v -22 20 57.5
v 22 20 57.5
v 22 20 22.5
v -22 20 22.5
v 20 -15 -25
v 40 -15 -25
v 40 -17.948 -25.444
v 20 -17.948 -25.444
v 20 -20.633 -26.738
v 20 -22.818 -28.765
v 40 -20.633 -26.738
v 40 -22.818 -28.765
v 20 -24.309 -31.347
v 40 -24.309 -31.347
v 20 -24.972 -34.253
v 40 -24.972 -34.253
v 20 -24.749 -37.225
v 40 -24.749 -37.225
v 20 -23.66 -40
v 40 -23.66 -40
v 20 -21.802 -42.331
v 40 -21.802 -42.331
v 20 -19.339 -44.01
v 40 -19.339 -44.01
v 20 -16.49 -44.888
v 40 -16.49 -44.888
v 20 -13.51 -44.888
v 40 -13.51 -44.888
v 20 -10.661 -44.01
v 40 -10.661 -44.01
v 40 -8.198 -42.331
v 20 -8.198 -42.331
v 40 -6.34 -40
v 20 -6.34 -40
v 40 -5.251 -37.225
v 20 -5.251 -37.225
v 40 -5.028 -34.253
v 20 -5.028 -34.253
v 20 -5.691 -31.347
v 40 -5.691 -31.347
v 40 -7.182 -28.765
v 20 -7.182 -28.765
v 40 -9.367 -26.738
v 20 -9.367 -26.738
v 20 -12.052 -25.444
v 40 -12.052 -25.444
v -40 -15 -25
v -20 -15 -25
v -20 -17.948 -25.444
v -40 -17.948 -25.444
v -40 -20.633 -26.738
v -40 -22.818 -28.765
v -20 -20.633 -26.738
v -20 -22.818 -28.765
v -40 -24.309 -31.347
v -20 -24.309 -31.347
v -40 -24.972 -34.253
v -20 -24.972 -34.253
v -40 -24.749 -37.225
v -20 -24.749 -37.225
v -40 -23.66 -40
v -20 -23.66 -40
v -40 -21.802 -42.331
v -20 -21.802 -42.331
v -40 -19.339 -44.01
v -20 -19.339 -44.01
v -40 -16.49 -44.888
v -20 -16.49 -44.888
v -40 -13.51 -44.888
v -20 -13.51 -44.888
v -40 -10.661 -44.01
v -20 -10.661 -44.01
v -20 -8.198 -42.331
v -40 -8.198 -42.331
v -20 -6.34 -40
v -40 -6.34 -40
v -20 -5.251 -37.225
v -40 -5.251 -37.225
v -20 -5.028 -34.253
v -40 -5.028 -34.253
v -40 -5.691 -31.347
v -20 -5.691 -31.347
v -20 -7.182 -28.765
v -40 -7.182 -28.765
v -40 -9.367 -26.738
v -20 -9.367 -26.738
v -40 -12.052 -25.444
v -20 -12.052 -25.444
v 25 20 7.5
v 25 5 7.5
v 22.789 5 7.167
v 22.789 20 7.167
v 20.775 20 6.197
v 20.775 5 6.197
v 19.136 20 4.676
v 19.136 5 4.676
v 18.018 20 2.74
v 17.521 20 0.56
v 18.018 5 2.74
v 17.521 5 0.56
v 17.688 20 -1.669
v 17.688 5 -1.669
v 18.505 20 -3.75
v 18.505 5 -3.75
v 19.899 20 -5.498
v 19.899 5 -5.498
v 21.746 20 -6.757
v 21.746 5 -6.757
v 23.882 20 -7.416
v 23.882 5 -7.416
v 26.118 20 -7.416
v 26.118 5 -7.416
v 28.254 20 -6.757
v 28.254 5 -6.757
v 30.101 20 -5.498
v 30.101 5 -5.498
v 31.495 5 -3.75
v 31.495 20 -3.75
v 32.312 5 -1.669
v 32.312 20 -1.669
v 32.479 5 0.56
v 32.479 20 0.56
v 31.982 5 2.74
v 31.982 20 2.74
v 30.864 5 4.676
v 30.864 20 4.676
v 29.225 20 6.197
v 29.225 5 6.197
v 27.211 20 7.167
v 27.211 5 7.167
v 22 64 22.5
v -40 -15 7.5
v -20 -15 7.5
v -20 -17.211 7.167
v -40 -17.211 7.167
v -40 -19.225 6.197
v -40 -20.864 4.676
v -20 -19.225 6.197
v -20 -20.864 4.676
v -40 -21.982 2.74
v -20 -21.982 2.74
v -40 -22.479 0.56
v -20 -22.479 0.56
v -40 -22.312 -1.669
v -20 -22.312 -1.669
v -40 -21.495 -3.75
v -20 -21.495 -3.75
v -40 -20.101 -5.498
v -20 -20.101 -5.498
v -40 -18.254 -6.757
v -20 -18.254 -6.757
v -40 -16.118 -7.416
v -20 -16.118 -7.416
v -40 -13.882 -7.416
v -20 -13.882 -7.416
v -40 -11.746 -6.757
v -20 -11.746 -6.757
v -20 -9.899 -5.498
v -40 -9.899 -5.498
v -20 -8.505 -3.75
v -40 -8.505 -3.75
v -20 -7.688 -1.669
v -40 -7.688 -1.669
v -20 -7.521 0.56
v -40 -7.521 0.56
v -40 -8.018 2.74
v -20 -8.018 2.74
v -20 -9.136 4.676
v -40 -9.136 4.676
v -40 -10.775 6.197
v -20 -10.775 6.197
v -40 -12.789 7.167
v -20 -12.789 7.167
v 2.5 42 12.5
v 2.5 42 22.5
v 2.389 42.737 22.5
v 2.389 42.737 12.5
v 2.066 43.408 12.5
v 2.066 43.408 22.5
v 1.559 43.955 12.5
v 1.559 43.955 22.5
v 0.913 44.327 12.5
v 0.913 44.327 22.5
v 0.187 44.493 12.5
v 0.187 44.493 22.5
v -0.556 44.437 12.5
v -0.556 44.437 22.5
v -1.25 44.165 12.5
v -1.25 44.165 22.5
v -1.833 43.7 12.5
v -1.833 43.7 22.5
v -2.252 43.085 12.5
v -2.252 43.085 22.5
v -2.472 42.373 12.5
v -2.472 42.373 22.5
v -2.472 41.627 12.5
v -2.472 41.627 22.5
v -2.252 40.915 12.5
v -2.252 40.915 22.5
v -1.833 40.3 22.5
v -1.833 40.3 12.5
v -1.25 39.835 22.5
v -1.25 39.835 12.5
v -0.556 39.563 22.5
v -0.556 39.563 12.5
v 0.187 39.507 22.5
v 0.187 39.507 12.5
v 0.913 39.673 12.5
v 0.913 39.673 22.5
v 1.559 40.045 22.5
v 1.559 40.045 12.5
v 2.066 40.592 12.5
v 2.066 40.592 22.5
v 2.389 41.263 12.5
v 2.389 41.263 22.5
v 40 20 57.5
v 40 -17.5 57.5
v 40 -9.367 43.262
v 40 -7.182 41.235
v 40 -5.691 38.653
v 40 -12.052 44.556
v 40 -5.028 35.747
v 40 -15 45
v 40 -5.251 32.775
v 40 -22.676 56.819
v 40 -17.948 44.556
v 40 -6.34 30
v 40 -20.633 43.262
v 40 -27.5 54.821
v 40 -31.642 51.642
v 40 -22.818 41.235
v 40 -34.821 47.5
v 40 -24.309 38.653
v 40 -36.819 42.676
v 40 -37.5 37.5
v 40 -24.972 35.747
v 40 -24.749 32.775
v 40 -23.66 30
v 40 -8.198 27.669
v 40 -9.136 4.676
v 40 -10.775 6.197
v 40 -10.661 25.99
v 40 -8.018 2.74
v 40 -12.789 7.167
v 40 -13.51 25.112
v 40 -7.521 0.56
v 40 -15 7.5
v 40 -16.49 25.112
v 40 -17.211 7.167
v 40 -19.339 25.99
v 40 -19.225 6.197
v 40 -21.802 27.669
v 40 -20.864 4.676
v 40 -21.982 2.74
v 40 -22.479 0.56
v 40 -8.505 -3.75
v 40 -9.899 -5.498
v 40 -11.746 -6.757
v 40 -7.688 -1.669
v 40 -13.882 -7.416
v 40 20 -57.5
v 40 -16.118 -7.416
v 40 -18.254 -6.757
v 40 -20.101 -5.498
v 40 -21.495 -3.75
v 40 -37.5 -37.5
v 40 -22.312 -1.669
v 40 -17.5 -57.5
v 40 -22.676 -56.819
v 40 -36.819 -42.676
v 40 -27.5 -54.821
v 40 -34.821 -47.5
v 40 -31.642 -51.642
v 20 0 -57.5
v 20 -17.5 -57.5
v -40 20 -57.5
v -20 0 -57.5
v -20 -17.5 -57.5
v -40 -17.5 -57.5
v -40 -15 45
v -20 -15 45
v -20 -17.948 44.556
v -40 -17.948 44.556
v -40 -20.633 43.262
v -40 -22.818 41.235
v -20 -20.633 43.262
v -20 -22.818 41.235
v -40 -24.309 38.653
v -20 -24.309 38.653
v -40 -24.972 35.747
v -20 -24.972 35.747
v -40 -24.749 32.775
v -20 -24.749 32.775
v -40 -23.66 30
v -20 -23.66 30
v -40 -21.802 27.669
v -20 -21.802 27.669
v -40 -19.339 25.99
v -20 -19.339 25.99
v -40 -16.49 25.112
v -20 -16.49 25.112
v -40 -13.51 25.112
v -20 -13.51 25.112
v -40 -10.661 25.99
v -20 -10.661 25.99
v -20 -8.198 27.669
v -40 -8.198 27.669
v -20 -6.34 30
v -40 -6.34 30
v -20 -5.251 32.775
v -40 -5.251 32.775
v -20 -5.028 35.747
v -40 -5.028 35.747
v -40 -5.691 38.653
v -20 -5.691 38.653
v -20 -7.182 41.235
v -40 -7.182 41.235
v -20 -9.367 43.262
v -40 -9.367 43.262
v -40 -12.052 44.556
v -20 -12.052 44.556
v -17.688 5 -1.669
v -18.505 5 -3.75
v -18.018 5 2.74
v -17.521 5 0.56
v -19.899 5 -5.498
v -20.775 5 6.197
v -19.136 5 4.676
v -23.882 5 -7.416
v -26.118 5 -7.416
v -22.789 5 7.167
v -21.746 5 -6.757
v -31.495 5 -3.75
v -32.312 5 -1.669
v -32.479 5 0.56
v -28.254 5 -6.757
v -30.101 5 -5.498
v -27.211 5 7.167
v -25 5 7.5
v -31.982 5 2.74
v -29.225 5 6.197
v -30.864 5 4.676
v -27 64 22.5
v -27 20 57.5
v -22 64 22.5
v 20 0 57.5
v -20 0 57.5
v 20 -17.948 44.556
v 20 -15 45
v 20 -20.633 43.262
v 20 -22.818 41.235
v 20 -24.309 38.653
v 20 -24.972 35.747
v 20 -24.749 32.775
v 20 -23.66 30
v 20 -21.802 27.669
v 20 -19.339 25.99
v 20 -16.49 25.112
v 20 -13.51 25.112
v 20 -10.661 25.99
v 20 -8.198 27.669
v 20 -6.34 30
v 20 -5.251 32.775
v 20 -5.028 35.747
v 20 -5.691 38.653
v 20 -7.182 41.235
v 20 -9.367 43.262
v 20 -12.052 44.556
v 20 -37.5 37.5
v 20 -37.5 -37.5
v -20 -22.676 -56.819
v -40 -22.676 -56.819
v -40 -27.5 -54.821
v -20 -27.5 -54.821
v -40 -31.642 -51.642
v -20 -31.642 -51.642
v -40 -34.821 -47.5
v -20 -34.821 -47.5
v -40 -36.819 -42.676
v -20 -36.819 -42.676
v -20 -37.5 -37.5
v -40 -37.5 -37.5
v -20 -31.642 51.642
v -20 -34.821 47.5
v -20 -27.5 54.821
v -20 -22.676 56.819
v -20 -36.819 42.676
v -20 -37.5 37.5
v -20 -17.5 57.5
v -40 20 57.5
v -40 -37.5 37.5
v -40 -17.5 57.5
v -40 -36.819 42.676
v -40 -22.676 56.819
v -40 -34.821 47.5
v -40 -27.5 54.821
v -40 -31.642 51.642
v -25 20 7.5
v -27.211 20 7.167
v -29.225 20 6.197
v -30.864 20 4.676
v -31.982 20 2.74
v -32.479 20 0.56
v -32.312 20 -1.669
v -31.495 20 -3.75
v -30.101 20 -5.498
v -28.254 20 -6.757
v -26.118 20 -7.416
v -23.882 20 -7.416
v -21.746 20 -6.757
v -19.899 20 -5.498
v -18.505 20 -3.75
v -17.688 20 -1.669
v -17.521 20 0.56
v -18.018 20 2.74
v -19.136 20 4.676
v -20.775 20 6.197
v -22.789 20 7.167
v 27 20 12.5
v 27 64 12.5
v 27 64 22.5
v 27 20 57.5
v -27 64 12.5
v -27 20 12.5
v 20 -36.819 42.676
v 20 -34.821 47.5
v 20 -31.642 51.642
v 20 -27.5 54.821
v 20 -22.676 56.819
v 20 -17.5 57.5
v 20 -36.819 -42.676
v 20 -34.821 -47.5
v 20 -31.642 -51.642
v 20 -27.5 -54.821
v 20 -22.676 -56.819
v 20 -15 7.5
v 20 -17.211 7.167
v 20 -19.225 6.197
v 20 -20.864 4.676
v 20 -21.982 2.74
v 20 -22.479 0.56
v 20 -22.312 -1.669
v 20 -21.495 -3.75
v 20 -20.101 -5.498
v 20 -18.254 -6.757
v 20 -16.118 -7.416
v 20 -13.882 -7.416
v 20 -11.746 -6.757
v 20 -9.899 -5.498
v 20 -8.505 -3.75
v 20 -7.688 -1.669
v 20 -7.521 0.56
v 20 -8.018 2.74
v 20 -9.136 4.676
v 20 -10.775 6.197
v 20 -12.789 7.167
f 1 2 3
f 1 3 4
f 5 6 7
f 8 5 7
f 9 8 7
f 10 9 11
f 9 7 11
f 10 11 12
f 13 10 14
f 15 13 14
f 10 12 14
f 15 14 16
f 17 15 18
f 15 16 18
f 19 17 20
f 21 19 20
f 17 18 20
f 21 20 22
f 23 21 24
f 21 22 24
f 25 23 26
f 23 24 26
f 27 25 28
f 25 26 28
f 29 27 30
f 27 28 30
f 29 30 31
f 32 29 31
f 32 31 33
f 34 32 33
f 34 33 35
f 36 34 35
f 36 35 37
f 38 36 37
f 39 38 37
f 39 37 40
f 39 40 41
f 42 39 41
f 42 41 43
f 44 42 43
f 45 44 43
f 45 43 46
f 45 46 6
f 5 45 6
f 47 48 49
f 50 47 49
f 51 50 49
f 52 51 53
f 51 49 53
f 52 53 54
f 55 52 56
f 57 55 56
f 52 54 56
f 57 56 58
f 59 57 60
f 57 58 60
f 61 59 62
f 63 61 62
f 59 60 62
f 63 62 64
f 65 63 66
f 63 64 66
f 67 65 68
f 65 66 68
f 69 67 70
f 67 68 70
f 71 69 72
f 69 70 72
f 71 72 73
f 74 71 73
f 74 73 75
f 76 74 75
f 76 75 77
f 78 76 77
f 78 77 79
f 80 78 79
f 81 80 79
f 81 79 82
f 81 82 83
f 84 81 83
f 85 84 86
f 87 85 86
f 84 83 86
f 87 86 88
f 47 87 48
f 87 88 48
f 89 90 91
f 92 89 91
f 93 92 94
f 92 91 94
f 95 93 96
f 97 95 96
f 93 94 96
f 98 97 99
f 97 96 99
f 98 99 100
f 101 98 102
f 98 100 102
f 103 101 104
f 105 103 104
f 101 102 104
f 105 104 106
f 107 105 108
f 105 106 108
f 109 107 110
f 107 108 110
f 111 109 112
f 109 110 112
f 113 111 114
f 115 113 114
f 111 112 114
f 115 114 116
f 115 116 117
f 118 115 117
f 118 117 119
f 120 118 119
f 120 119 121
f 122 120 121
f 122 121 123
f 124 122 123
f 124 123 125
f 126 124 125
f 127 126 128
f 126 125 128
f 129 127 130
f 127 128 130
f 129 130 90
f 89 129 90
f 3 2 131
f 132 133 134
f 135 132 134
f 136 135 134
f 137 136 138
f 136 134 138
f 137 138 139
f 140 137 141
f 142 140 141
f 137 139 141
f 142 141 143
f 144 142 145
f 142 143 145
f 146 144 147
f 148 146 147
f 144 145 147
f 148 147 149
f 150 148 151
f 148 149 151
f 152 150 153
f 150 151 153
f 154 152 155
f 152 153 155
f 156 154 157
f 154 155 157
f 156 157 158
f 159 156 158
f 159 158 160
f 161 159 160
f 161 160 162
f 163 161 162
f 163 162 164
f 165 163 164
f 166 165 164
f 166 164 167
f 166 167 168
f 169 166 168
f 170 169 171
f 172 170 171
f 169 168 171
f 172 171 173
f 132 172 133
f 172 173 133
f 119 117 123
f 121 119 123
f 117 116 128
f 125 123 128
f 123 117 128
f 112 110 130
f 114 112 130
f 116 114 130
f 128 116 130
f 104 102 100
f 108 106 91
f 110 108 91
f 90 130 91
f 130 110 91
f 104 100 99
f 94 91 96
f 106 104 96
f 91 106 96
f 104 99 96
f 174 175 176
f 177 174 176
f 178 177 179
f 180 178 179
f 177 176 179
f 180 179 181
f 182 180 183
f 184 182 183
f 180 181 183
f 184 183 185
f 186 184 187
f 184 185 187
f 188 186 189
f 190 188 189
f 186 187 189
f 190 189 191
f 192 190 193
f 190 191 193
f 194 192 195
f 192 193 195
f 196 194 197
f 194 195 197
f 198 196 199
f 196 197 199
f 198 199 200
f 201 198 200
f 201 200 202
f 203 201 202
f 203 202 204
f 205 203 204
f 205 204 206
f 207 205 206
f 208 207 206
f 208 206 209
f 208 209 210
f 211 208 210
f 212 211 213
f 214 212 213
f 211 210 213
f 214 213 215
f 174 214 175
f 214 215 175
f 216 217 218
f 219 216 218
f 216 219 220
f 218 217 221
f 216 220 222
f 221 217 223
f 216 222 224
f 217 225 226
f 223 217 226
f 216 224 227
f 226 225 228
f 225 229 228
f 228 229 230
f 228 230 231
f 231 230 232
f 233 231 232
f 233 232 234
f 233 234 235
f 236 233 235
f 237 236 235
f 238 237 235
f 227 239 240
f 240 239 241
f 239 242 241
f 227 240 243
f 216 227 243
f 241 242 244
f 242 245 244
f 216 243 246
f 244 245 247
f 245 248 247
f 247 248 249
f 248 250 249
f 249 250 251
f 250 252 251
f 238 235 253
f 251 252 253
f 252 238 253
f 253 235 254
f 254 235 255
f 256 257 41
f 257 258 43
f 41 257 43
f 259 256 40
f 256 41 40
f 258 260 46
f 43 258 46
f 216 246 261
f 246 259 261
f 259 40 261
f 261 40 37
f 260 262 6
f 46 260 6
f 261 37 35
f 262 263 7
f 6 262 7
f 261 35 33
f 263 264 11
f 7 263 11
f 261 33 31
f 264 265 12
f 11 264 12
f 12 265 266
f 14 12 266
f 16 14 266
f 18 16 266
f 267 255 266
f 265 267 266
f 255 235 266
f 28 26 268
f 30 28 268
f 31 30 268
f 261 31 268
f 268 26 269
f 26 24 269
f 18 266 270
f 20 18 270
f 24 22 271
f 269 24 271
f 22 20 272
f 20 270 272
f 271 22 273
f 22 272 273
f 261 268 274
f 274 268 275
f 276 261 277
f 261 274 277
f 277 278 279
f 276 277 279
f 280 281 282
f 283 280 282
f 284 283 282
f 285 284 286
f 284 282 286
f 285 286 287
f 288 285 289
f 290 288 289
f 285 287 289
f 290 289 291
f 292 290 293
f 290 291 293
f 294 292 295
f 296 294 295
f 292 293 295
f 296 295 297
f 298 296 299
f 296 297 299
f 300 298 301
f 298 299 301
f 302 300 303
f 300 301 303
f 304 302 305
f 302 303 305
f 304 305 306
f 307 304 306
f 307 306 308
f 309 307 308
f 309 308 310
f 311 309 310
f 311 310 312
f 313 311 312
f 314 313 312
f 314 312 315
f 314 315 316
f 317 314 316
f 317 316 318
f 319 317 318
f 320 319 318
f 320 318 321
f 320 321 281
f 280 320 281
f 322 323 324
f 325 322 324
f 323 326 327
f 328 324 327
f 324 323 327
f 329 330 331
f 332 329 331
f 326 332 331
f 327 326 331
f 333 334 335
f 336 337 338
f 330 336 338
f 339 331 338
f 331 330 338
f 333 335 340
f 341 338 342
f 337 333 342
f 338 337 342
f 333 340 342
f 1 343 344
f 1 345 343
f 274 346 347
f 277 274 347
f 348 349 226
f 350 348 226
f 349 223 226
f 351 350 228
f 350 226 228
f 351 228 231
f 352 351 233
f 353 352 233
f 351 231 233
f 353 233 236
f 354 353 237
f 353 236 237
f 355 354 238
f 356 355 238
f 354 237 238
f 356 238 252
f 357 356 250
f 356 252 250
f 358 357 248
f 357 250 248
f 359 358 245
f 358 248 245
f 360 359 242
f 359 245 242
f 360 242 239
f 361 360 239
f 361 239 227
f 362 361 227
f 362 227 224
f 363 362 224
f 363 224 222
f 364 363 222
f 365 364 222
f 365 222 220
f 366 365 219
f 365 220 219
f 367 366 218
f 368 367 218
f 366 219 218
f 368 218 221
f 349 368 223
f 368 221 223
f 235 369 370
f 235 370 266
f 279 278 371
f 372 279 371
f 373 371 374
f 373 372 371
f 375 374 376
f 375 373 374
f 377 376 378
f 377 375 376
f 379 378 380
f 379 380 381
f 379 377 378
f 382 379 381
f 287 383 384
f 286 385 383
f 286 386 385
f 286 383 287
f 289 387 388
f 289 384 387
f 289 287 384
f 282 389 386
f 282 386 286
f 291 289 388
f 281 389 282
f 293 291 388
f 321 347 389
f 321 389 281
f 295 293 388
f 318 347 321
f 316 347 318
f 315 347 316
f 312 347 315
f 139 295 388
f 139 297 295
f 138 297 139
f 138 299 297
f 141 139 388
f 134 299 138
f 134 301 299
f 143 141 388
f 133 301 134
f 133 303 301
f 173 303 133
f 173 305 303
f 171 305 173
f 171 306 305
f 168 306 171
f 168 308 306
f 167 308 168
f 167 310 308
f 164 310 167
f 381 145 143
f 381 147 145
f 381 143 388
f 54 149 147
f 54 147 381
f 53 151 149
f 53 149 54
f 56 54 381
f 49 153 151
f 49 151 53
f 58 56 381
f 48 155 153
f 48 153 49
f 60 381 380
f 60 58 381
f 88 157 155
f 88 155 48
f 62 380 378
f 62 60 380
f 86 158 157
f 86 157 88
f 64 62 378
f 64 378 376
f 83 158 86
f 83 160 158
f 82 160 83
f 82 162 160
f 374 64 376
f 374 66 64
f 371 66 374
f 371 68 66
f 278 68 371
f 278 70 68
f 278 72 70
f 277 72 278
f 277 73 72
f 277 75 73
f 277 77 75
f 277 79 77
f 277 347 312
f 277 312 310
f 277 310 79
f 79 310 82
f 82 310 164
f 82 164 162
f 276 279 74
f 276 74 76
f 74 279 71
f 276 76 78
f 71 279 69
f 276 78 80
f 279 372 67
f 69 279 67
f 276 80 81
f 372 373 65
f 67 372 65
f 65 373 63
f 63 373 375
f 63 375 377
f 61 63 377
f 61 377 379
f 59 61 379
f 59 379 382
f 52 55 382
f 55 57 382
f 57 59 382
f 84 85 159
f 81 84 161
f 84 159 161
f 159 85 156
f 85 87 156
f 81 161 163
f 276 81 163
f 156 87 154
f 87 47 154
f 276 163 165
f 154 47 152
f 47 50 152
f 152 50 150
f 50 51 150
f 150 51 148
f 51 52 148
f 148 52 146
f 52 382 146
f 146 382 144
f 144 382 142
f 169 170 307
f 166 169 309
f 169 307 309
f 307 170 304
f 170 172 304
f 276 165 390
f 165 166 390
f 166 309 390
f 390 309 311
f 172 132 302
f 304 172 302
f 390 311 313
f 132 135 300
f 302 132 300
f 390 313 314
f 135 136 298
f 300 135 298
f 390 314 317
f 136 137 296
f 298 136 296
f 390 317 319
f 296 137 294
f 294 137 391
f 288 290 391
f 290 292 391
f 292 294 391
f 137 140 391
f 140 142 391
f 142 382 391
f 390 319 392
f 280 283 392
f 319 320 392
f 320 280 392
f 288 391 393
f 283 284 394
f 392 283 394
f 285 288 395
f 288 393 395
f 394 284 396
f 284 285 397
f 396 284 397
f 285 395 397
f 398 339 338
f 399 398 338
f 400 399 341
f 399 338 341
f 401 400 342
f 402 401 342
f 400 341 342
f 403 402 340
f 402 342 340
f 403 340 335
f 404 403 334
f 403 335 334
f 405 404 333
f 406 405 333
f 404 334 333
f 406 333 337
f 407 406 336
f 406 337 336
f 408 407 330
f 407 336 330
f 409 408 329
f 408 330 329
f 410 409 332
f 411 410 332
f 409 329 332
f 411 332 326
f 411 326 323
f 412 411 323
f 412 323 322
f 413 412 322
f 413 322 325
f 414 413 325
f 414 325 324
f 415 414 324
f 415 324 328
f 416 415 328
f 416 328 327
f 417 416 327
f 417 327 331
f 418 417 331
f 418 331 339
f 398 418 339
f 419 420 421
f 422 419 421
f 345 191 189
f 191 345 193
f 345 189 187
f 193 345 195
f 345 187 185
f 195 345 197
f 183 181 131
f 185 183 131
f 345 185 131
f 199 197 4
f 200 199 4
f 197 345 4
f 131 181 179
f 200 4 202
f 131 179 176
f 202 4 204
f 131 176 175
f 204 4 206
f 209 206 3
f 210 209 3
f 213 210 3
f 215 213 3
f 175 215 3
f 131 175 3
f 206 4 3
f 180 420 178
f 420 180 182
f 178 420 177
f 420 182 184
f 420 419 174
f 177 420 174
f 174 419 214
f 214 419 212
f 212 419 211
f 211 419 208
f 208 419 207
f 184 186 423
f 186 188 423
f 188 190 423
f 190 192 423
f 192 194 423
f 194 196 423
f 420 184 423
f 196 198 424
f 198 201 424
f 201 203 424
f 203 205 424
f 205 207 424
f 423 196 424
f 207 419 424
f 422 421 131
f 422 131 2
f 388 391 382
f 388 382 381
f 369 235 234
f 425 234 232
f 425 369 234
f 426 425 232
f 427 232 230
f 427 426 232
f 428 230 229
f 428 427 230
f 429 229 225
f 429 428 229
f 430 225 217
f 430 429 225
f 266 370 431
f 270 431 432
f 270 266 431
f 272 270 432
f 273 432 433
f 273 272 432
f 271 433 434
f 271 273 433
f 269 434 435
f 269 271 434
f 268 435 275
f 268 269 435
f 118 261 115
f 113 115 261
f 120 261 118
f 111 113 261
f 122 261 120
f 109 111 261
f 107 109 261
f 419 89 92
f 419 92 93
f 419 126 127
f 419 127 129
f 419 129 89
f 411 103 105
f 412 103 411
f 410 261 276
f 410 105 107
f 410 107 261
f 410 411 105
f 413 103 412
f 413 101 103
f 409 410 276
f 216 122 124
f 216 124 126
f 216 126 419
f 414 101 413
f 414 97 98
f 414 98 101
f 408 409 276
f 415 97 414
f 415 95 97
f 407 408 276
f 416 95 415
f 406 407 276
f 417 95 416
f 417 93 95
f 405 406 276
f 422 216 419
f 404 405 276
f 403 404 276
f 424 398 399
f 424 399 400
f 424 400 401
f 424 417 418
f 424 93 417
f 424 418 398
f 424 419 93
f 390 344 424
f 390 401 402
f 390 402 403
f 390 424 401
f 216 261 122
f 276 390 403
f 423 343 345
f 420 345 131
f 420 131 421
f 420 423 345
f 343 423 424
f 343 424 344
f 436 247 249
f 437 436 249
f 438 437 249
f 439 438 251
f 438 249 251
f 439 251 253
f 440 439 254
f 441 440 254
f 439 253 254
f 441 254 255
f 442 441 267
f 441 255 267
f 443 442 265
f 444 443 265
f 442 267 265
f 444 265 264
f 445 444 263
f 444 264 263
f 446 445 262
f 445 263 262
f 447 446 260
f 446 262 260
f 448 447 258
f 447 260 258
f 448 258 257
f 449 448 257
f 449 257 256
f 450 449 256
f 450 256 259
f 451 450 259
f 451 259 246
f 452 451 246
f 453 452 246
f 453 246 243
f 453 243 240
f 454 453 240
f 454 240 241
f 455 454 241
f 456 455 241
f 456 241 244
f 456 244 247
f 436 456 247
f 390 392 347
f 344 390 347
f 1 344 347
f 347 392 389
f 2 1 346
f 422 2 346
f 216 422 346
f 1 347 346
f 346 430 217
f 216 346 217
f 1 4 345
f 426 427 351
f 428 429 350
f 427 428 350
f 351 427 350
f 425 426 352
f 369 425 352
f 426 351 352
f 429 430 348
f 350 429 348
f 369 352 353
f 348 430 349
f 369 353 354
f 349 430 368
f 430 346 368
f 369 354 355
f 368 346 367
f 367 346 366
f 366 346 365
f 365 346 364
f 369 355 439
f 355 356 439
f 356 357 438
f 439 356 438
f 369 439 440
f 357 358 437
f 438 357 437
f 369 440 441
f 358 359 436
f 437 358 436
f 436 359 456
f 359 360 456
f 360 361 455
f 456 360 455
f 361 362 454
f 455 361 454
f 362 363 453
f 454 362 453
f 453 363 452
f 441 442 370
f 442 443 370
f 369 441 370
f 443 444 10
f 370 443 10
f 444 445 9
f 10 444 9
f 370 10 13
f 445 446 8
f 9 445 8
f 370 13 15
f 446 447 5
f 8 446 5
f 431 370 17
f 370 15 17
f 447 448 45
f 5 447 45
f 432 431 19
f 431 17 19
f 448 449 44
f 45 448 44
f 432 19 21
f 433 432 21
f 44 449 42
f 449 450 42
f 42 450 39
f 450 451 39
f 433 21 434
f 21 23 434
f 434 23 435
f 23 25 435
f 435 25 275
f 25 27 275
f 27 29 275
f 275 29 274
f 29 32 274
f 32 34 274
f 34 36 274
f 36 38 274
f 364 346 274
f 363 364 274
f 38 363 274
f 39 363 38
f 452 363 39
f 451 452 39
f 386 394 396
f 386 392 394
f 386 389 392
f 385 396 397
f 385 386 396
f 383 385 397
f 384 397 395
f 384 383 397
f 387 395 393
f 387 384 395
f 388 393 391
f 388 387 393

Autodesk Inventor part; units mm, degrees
ref_plane "YZ Plane" through (0, 0, 0) normal (1, 0, 0) x (0, 1, 0)
ref_plane "XZ Plane" through (0, 0, 0) normal (0, 1, 0) x (-1, 0, 0)
ref_plane "XY Plane" through (0, 0, 0) normal (0, 0, 1) x (1, 0, 0)
sketch "Sketch1" plane through (0, 0, 0) normal (0, 1, 0) x (-1, 0, 0)
  line L0 (40, 57.5) -> (-40, 57.5)
  line L1 (-40, 57.5) -> (-40, -57.5)
  line L2 (-40, -57.5) -> (40, -57.5)
  line L3 (40, -57.5) -> (40, 57.5)
  point P0 (0, 0)
  point P1 (40, 0)
  point P2 (0, 57.5)
  dimension "d0" = 115
  dimension "d1" = 80
extrude "Extrusion1" add sketch "Sketch1" along normal blind 20
sketch "Sketch12" plane through (0, 0, 0) normal (0, -1, 0) x (1, 0, 0)
  line L0 (-40, 57.5) -> (-20, 57.5)
  line L1 (-20, 57.5) -> (-20, -57.5)
  line L2 (-20, -57.5) -> (-40, -57.5)
  line L3 (-40, -57.5) -> (-40, 57.5)
  line L4 (-40, -57.5) -> (-40, 57.5) projected
  line L5 (0, 100.8809) -> (0, -116.5773) construction
  line L6 (40, 57.5) -> (20, 57.5)
  line L7 (20, 57.5) -> (20, -57.5)
  line L8 (20, -57.5) -> (40, -57.5)
  line L9 (40, -57.5) -> (40, 57.5)
  point P0 (0, 0)
  point P1 (-40, 0)
  point P2 (0, 0)
  point P3 (-20, 0)
  dimension "d56" = 20
  dimension "d57" = 115
extrude "Extrusion11" add sketch "Sketch12" along normal blind 37.5
sketch "Sketch13" plane through (-40, 0, 57.5) normal (-1, 0, 0) x (0, 0, 1)
  line L0 (0, 0) -> (-115, 0) projected
  point P0 (-57.5, 0)
  point P1 (-22.5, -15)
  point P2 (-92.5, -15)
  point P3 (-57.5, -15)
  point P4 (-57.5, 0)
  dimension "d129" = 35
  dimension "d130" = 35
  dimension "d131" = 15
hole "Hole2" at (-40, -15, 35) at (-40, -15, -35) direction (1, 0, 0) diameter 20 end through all
hole "Hole3" at (-40, -15, 0) direction (1, 0, 0) diameter 15 end through all
sketch "Sketch19" plane through (0, 20, 0) normal (0, 1, 0) x (1, 0, 0)
  point P0 (0, 0)
  point P1 (25, 0)
  point P2 (-25, 0)
  dimension "d111" = 25
  dimension "d112" = 25
hole "Hole6" at (25, 20, 0) at (-25, 20, 0) direction (0, -1, 0) diameter 15 depth 15
fillet "Fillet19" radius 20 4 edges at (-30, -37.5, -57.5) (30, -37.5, -57.5) (30, -37.5, 57.5) (-30, -37.5, 57.5)
sketch "Sketch20" plane through (0, 20, 0) normal (0, 1, 0) x (1, 0, 0)
  line L0 (-27, -22.5) -> (27, -22.5)
  line L1 (27, -22.5) -> (27, -12.5)
  line L2 (27, -12.5) -> (-27, -12.5)
  line L3 (-27, -12.5) -> (-27, -22.5)
  line L4 (-40, 57.5) -> (-40, -57.5) projected
  line L5 (40, -57.5) -> (40, 57.5) projected
  line L6 (-40, -57.5) -> (40, -57.5) projected
  point P0 (0, 0)
  point P1 (0, -12.5)
  dimension "d56" = 20
  dimension "d122" = 10
  dimension "d151" = 45
  dimension "d152" = 54
extrude "Extrusion15" add sketch "Sketch20" along normal blind 44
sketch "Sketch21" plane through (-40, 20, 22.5) normal (0, 0, 1) x (1, 0, 0)
  circle A0 centre (40, 22) radius 2.5
  line L0 (20, -20) -> (60, -20) projected
  line L1 (13, 44) -> (67, 44) projected
  point P0 (40, -20)
  point P1 (40, -20)
  point P2 (0, -20)
  point P3 (80, -20)
  point P4 (24.5, 37.5)
  point P5 (24.5, 6.5)
  point P6 (55.5, 6.5)
  point P7 (55.5, 37.5)
  dimension "d128" = 5
  dimension "d132" = 22
  dimension "d138" = 360
extrude "Extrusion16" cut sketch "Sketch21" against normal blind 50
sketch "Sketch24" plane through (0, 20, 0) normal (0, 1, 0) x (1, 0, 0)
  line L0 (-27, -22.5) -> (-22, -22.5)
  line L1 (-22, -22.5) -> (-22, -57.5)
  line L2 (-22, -57.5) -> (-27, -57.5)
  line L3 (-27, -57.5) -> (-27, -22.5)
  line L4 (-27, -22.5) -> (-27, -12.5) projected
  line L5 (27, -22.5) -> (-27, -22.5) projected
  line L6 (-40, -57.5) -> (40, -57.5) projected
  line L7 (22, -22.5) -> (27, -22.5)
  line L8 (27, -22.5) -> (27, -57.5)
  line L9 (27, -57.5) -> (22, -57.5)
  line L10 (22, -57.5) -> (22, -22.5)
  line L11 (27, -12.5) -> (27, -22.5) projected
  point P0 (0, 0)
  dimension "d155" = 5
  dimension "d156" = 5
extrude "Extrusion18" add sketch "Sketch24" along normal blind 44 contours L0 L1 L2 L3 | L5 L8 L6 L10
sketch "Sketch25" plane through (27, 20, 57.5) normal (1, 0, 0) x (0, 0, -1)
  line L0 (35, 44) -> (0, 0)
  line L1 (0, 44) -> (35, 44)
  line L2 (0, 44) -> (0, 0)
  line L3 (45, 0) -> (45, 44) projected
  point P0 (57.5, -20)
  dimension "d161" = 10
extrude "Extrusion19" cut sketch "Sketch25" against normal blind 100
properties part number "Y_Slider_Part_mit_Schrittmotor"
